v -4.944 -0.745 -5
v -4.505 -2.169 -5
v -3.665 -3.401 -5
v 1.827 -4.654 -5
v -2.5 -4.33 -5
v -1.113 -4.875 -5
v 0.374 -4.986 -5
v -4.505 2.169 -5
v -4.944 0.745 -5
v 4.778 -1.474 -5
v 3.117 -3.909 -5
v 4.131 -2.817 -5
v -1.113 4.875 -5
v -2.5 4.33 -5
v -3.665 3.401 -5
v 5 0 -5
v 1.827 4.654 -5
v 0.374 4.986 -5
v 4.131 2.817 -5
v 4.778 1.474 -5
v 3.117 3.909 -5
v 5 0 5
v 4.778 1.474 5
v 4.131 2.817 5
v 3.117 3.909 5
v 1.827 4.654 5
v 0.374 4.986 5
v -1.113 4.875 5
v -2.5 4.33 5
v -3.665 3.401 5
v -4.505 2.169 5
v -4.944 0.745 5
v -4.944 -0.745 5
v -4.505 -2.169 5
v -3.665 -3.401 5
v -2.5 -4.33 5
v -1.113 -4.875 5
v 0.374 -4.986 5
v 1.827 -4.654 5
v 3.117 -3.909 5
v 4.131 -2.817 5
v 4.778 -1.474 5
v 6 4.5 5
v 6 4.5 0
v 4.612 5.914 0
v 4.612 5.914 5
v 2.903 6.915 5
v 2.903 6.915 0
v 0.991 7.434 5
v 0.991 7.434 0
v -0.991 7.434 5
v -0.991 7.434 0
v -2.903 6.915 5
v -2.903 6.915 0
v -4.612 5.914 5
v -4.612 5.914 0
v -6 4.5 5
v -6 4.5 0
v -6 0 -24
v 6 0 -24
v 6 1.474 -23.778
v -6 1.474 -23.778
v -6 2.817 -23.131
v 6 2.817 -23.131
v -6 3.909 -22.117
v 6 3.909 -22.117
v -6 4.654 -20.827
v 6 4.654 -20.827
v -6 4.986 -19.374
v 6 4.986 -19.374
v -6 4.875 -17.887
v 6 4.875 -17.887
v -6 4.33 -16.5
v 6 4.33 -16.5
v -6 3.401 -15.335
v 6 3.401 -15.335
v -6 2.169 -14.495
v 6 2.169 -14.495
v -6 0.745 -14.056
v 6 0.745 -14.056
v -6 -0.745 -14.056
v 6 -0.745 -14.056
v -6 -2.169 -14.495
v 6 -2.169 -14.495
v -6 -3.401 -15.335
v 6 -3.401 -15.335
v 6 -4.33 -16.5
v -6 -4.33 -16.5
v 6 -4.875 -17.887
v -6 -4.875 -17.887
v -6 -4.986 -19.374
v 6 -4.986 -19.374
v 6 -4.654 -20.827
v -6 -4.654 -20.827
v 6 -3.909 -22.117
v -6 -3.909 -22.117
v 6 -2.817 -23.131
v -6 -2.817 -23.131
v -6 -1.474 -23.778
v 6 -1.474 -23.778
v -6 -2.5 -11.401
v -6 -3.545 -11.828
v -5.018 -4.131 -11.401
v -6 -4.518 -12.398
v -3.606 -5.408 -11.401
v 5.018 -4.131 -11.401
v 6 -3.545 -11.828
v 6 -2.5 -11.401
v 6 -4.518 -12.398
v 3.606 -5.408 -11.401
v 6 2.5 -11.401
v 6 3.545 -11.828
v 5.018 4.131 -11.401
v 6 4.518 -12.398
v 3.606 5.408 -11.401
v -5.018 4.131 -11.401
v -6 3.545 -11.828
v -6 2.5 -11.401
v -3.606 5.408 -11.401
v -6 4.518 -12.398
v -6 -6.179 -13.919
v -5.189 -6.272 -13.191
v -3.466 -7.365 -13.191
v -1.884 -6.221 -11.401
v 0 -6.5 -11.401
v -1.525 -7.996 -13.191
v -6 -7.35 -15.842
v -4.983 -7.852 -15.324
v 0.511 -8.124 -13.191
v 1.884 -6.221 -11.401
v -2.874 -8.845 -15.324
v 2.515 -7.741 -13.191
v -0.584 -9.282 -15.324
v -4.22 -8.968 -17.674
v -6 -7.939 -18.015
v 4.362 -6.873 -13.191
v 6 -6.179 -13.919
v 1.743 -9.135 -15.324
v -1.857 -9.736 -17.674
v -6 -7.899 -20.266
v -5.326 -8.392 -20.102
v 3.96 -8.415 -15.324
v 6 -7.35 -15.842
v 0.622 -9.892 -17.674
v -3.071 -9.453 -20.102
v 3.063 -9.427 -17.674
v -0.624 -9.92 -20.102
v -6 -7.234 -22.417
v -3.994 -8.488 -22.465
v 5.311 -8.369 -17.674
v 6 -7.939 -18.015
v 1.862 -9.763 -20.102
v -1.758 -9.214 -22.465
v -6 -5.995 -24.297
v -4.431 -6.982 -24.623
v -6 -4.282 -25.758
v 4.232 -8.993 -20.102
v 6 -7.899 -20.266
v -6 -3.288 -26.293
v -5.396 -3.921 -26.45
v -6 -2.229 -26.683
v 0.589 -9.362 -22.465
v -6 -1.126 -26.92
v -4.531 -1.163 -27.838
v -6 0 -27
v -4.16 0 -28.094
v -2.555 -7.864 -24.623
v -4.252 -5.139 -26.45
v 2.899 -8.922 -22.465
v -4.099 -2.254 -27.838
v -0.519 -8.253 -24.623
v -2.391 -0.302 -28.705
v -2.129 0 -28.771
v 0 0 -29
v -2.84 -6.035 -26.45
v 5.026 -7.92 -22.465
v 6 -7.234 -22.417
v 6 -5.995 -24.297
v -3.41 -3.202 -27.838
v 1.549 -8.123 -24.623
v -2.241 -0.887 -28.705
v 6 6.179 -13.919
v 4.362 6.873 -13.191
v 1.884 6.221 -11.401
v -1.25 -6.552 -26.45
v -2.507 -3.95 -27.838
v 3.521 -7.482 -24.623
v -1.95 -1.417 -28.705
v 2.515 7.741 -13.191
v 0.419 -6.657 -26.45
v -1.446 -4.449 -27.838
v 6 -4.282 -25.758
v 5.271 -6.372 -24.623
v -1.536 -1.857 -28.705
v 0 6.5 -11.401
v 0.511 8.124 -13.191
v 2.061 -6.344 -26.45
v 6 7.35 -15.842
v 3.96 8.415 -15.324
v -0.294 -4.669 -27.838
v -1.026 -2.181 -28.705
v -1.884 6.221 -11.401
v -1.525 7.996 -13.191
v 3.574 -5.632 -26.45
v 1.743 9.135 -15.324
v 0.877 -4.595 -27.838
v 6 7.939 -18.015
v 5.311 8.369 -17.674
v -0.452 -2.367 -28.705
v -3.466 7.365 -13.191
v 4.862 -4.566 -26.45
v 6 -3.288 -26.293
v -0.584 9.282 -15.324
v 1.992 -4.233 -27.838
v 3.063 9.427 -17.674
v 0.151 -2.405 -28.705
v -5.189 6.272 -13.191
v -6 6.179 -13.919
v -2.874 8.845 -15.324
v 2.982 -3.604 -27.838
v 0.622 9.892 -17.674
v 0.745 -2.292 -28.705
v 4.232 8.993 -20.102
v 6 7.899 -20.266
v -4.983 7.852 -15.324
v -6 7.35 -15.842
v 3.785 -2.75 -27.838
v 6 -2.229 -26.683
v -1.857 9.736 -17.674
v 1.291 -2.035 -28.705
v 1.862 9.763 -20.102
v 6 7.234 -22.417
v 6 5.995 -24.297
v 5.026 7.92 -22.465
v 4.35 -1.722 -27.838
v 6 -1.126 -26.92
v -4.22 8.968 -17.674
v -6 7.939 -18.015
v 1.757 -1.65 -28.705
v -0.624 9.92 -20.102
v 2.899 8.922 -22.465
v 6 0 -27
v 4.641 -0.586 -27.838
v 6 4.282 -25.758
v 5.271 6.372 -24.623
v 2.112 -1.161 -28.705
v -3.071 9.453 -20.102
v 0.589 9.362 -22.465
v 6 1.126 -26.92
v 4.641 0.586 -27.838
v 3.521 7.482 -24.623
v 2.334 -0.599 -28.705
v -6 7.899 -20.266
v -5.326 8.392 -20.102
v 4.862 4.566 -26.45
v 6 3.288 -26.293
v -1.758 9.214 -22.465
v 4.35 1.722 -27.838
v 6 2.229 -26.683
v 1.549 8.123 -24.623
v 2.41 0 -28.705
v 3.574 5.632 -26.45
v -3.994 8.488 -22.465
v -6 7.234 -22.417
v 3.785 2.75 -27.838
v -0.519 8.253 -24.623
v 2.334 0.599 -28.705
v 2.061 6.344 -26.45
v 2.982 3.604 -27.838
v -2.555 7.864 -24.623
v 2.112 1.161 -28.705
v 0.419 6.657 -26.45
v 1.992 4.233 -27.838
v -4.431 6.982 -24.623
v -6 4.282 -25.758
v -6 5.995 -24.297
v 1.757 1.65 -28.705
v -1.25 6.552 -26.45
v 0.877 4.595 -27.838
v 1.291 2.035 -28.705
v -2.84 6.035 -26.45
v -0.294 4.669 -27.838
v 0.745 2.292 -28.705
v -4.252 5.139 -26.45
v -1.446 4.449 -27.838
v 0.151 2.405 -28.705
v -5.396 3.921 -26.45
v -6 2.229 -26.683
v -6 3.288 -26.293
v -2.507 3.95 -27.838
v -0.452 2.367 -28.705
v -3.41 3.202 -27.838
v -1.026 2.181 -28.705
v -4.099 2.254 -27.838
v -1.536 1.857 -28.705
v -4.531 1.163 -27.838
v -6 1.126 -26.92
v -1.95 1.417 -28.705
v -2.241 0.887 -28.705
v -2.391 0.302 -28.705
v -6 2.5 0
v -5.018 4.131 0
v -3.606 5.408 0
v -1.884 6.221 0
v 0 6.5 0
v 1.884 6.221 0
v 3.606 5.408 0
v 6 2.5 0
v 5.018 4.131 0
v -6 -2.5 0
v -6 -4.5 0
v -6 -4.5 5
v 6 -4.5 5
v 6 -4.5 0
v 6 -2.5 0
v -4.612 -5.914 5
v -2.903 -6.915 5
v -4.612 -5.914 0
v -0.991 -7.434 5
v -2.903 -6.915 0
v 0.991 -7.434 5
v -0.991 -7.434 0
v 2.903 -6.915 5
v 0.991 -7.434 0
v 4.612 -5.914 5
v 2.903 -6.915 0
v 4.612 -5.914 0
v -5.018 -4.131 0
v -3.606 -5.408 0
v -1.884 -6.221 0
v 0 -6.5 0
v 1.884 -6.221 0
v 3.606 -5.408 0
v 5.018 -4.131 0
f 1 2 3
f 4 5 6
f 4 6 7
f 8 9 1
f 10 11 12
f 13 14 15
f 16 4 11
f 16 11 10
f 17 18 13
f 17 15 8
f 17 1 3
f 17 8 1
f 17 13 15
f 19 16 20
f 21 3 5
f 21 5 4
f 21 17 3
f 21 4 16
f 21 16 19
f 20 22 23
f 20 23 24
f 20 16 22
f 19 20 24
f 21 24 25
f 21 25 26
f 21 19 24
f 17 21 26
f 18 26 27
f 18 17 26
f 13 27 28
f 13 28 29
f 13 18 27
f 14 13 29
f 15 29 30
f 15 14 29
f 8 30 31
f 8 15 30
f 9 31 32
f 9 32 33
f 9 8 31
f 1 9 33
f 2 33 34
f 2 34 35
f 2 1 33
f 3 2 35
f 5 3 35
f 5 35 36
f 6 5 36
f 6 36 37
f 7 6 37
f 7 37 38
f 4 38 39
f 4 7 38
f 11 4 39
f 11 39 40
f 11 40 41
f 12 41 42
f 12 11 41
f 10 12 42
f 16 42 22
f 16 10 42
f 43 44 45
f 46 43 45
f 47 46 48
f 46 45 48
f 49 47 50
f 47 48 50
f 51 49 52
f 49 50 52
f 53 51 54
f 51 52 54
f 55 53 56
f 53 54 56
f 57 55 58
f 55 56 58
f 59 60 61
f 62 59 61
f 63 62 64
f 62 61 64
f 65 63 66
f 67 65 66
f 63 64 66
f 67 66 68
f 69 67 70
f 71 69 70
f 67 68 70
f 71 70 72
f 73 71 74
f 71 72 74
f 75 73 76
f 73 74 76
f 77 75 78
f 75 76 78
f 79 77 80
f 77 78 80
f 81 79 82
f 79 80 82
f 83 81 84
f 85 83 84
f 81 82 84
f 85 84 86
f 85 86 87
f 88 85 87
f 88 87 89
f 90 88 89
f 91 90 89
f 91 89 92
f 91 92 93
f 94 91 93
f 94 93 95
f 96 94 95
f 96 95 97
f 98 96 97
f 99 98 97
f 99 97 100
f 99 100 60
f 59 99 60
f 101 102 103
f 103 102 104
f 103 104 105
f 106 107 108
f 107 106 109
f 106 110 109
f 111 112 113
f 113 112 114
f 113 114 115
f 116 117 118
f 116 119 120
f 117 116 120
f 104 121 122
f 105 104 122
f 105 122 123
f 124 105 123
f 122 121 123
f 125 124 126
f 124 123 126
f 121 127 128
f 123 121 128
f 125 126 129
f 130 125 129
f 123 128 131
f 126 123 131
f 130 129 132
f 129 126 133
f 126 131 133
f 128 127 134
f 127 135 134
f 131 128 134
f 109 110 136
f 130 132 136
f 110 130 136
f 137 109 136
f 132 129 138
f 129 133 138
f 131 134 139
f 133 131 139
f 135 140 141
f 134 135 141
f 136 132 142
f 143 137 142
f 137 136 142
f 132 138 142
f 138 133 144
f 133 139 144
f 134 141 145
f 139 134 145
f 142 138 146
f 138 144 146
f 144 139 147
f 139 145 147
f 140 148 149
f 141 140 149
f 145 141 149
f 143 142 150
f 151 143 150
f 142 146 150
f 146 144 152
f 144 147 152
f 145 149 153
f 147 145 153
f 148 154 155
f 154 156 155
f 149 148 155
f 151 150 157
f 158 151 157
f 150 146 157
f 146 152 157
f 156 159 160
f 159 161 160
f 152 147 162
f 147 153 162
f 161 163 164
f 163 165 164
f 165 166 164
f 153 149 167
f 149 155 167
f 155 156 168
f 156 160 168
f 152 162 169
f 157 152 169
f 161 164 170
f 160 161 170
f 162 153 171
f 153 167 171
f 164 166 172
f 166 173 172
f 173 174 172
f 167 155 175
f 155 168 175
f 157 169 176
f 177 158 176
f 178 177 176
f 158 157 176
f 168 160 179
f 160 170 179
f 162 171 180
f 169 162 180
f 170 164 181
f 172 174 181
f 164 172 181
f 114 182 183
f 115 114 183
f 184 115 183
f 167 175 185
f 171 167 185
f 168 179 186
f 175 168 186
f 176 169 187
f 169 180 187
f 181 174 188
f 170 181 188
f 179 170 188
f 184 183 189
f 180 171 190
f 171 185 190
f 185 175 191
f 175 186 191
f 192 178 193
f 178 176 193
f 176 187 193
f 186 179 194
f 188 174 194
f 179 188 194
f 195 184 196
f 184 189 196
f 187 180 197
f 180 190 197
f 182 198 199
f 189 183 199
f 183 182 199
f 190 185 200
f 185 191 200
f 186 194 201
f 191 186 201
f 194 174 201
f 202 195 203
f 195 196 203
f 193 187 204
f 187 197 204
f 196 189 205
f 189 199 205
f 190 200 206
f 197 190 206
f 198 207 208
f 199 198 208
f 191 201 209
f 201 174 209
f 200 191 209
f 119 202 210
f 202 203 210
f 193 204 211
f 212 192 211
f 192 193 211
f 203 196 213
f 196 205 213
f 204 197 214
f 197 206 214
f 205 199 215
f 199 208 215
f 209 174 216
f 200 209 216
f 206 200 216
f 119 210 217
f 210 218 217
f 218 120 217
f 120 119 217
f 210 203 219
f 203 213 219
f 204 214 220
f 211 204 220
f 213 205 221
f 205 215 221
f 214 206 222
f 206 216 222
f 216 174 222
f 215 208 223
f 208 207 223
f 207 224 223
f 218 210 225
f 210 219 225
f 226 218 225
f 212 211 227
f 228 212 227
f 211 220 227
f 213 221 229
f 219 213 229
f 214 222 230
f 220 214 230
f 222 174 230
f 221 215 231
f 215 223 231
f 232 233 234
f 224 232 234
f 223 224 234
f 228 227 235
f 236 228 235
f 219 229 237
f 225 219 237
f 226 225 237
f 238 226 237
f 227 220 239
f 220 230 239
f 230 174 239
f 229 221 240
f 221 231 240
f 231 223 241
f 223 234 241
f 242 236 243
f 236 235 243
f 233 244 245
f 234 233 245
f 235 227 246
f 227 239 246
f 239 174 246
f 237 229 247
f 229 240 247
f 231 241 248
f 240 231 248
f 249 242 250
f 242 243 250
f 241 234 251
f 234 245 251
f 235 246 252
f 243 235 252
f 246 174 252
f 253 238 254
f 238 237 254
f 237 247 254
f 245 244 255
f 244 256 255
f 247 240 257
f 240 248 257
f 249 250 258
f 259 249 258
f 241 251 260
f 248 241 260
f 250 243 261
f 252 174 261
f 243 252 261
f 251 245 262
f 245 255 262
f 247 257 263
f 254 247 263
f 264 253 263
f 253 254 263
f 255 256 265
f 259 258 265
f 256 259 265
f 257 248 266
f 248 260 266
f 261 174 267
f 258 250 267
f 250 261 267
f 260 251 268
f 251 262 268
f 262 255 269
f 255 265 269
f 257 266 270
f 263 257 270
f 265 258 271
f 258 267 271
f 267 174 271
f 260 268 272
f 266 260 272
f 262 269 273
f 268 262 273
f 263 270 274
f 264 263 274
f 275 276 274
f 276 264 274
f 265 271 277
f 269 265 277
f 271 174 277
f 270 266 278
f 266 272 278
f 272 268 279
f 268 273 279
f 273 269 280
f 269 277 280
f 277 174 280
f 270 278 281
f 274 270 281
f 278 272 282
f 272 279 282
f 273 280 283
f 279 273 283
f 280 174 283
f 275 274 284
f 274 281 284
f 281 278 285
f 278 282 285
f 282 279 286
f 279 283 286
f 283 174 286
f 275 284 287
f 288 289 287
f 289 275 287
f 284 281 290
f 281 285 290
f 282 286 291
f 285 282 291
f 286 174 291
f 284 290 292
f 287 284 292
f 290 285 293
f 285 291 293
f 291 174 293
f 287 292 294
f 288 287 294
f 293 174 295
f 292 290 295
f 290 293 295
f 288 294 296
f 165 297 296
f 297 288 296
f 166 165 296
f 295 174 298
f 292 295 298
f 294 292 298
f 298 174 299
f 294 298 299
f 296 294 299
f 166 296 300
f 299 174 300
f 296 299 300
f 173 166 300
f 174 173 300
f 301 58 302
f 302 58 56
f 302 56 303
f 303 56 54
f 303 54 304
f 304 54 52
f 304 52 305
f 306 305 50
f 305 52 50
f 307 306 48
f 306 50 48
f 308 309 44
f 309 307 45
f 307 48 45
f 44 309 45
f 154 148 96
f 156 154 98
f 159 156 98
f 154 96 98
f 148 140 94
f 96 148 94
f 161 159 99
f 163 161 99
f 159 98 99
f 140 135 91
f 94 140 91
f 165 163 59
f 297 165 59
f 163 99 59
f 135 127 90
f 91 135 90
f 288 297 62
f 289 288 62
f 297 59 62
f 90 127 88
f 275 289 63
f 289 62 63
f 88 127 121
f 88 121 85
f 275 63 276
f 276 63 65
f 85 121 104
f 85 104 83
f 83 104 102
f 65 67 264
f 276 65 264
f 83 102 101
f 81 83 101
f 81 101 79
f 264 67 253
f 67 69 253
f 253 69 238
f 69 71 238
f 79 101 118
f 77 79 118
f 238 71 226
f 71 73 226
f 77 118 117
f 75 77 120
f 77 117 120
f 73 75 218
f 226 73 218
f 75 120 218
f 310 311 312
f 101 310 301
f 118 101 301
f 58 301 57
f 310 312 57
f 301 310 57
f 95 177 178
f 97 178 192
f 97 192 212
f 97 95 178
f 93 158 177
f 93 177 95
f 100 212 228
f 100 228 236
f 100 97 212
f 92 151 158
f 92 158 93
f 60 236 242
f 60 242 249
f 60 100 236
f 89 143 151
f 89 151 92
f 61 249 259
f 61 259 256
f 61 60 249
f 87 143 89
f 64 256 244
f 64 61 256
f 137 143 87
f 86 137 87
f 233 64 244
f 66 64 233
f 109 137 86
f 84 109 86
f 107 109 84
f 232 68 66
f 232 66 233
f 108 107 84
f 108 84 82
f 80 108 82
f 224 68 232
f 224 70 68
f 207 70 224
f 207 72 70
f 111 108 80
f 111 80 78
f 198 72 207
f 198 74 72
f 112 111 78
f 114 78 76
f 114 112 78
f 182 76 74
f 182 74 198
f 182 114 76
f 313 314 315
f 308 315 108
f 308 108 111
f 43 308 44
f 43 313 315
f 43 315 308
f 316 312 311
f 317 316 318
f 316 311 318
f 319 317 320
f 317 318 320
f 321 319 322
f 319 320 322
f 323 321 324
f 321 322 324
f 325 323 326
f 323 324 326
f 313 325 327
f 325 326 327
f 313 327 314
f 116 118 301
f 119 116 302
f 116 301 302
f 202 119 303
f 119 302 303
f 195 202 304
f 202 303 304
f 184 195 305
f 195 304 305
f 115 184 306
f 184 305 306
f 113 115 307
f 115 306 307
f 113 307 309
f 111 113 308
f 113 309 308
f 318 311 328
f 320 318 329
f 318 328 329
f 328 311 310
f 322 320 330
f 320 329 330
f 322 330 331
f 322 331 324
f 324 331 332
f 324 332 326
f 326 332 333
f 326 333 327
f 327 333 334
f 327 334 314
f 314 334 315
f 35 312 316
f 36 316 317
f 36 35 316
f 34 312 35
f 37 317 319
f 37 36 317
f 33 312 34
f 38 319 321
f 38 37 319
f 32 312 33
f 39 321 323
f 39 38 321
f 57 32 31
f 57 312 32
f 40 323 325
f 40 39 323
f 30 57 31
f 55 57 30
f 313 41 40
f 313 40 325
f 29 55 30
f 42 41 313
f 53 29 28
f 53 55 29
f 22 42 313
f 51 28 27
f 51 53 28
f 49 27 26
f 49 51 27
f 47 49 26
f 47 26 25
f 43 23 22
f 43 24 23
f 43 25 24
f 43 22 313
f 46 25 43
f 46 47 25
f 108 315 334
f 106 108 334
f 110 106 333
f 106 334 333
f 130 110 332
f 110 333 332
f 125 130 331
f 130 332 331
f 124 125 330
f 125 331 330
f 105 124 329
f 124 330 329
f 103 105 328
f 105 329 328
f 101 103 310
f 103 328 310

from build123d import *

# Parameters (mm, degrees)
SKETCH1_R           = 7.5
SKETCH1_R_2         = 5
BOSS_EXTRUDE1_DEPTH = 5
SKETCH2_R           = 6.5
BOSS_EXTRUDE2_DEPTH = 19
SKETCH4_W           = 21.748753338
SKETCH4_H           = 30.770097212
SKETCH4_W_2         = 12
SKETCH4_H_2         = 21.36247908
CUT_EXTRUDE1_DEPTH  = 38
SKETCH5_R           = 5
CUT_EXTRUDE2_DEPTH  = 5
SKETCH6_R           = 5
CUT_EXTRUDE3_DEPTH  = 37


with BuildPart() as part:
    # Sketch1 → Boss-Extrude1 (new body)
    with BuildSketch(Plane.XY):
        Circle(SKETCH1_R)
        Circle(SKETCH1_R_2, mode=Mode.SUBTRACT)
    extrude(amount=BOSS_EXTRUDE1_DEPTH)

    # Sketch2 → Boss-Extrude2 (add)
    with BuildSketch(Plane(origin=(0, 0, 0), x_dir=(-1, 0, 0), z_dir=(0, 0, -1))):
        Circle(SKETCH2_R)
    extrude(amount=BOSS_EXTRUDE2_DEPTH)

    # Sketch3 → Revolve9 (revolve)
    with BuildSketch(Plane(origin=(0, 0, 0), x_dir=(1, 0, 0), z_dir=(0, 1, 0))):
        with BuildLine():
            Line((0, 29), (0, 9))
            ThreePointArc((0, 9), (-10, 19), (0, 29))
        make_face()
    revolve(axis=Axis((0, 0, -29), (0, 0, 1)))

    # Sketch4 → Cut-Extrude1 (cut)
    with BuildSketch(Plane.XY.offset(5)):
        Rectangle(SKETCH4_W, SKETCH4_H)
        Rectangle(SKETCH4_W_2, SKETCH4_H_2, mode=Mode.SUBTRACT)
    extrude(amount=-CUT_EXTRUDE1_DEPTH, mode=Mode.SUBTRACT)

    # Sketch5 → Cut-Extrude2 (cut)
    with BuildSketch(Plane.XY):
        Circle(SKETCH5_R)
    extrude(amount=-CUT_EXTRUDE2_DEPTH, mode=Mode.SUBTRACT)

    # Sketch6 → Cut-Extrude3 (cut)
    with BuildSketch(Plane(origin=(6, 0, 0), x_dir=(0, 0, -1), z_dir=(1, 0, 0))):
        with Locations((19, 0)):
            Circle(SKETCH6_R)
    extrude(amount=-CUT_EXTRUDE3_DEPTH, mode=Mode.SUBTRACT)


solid = part.part
